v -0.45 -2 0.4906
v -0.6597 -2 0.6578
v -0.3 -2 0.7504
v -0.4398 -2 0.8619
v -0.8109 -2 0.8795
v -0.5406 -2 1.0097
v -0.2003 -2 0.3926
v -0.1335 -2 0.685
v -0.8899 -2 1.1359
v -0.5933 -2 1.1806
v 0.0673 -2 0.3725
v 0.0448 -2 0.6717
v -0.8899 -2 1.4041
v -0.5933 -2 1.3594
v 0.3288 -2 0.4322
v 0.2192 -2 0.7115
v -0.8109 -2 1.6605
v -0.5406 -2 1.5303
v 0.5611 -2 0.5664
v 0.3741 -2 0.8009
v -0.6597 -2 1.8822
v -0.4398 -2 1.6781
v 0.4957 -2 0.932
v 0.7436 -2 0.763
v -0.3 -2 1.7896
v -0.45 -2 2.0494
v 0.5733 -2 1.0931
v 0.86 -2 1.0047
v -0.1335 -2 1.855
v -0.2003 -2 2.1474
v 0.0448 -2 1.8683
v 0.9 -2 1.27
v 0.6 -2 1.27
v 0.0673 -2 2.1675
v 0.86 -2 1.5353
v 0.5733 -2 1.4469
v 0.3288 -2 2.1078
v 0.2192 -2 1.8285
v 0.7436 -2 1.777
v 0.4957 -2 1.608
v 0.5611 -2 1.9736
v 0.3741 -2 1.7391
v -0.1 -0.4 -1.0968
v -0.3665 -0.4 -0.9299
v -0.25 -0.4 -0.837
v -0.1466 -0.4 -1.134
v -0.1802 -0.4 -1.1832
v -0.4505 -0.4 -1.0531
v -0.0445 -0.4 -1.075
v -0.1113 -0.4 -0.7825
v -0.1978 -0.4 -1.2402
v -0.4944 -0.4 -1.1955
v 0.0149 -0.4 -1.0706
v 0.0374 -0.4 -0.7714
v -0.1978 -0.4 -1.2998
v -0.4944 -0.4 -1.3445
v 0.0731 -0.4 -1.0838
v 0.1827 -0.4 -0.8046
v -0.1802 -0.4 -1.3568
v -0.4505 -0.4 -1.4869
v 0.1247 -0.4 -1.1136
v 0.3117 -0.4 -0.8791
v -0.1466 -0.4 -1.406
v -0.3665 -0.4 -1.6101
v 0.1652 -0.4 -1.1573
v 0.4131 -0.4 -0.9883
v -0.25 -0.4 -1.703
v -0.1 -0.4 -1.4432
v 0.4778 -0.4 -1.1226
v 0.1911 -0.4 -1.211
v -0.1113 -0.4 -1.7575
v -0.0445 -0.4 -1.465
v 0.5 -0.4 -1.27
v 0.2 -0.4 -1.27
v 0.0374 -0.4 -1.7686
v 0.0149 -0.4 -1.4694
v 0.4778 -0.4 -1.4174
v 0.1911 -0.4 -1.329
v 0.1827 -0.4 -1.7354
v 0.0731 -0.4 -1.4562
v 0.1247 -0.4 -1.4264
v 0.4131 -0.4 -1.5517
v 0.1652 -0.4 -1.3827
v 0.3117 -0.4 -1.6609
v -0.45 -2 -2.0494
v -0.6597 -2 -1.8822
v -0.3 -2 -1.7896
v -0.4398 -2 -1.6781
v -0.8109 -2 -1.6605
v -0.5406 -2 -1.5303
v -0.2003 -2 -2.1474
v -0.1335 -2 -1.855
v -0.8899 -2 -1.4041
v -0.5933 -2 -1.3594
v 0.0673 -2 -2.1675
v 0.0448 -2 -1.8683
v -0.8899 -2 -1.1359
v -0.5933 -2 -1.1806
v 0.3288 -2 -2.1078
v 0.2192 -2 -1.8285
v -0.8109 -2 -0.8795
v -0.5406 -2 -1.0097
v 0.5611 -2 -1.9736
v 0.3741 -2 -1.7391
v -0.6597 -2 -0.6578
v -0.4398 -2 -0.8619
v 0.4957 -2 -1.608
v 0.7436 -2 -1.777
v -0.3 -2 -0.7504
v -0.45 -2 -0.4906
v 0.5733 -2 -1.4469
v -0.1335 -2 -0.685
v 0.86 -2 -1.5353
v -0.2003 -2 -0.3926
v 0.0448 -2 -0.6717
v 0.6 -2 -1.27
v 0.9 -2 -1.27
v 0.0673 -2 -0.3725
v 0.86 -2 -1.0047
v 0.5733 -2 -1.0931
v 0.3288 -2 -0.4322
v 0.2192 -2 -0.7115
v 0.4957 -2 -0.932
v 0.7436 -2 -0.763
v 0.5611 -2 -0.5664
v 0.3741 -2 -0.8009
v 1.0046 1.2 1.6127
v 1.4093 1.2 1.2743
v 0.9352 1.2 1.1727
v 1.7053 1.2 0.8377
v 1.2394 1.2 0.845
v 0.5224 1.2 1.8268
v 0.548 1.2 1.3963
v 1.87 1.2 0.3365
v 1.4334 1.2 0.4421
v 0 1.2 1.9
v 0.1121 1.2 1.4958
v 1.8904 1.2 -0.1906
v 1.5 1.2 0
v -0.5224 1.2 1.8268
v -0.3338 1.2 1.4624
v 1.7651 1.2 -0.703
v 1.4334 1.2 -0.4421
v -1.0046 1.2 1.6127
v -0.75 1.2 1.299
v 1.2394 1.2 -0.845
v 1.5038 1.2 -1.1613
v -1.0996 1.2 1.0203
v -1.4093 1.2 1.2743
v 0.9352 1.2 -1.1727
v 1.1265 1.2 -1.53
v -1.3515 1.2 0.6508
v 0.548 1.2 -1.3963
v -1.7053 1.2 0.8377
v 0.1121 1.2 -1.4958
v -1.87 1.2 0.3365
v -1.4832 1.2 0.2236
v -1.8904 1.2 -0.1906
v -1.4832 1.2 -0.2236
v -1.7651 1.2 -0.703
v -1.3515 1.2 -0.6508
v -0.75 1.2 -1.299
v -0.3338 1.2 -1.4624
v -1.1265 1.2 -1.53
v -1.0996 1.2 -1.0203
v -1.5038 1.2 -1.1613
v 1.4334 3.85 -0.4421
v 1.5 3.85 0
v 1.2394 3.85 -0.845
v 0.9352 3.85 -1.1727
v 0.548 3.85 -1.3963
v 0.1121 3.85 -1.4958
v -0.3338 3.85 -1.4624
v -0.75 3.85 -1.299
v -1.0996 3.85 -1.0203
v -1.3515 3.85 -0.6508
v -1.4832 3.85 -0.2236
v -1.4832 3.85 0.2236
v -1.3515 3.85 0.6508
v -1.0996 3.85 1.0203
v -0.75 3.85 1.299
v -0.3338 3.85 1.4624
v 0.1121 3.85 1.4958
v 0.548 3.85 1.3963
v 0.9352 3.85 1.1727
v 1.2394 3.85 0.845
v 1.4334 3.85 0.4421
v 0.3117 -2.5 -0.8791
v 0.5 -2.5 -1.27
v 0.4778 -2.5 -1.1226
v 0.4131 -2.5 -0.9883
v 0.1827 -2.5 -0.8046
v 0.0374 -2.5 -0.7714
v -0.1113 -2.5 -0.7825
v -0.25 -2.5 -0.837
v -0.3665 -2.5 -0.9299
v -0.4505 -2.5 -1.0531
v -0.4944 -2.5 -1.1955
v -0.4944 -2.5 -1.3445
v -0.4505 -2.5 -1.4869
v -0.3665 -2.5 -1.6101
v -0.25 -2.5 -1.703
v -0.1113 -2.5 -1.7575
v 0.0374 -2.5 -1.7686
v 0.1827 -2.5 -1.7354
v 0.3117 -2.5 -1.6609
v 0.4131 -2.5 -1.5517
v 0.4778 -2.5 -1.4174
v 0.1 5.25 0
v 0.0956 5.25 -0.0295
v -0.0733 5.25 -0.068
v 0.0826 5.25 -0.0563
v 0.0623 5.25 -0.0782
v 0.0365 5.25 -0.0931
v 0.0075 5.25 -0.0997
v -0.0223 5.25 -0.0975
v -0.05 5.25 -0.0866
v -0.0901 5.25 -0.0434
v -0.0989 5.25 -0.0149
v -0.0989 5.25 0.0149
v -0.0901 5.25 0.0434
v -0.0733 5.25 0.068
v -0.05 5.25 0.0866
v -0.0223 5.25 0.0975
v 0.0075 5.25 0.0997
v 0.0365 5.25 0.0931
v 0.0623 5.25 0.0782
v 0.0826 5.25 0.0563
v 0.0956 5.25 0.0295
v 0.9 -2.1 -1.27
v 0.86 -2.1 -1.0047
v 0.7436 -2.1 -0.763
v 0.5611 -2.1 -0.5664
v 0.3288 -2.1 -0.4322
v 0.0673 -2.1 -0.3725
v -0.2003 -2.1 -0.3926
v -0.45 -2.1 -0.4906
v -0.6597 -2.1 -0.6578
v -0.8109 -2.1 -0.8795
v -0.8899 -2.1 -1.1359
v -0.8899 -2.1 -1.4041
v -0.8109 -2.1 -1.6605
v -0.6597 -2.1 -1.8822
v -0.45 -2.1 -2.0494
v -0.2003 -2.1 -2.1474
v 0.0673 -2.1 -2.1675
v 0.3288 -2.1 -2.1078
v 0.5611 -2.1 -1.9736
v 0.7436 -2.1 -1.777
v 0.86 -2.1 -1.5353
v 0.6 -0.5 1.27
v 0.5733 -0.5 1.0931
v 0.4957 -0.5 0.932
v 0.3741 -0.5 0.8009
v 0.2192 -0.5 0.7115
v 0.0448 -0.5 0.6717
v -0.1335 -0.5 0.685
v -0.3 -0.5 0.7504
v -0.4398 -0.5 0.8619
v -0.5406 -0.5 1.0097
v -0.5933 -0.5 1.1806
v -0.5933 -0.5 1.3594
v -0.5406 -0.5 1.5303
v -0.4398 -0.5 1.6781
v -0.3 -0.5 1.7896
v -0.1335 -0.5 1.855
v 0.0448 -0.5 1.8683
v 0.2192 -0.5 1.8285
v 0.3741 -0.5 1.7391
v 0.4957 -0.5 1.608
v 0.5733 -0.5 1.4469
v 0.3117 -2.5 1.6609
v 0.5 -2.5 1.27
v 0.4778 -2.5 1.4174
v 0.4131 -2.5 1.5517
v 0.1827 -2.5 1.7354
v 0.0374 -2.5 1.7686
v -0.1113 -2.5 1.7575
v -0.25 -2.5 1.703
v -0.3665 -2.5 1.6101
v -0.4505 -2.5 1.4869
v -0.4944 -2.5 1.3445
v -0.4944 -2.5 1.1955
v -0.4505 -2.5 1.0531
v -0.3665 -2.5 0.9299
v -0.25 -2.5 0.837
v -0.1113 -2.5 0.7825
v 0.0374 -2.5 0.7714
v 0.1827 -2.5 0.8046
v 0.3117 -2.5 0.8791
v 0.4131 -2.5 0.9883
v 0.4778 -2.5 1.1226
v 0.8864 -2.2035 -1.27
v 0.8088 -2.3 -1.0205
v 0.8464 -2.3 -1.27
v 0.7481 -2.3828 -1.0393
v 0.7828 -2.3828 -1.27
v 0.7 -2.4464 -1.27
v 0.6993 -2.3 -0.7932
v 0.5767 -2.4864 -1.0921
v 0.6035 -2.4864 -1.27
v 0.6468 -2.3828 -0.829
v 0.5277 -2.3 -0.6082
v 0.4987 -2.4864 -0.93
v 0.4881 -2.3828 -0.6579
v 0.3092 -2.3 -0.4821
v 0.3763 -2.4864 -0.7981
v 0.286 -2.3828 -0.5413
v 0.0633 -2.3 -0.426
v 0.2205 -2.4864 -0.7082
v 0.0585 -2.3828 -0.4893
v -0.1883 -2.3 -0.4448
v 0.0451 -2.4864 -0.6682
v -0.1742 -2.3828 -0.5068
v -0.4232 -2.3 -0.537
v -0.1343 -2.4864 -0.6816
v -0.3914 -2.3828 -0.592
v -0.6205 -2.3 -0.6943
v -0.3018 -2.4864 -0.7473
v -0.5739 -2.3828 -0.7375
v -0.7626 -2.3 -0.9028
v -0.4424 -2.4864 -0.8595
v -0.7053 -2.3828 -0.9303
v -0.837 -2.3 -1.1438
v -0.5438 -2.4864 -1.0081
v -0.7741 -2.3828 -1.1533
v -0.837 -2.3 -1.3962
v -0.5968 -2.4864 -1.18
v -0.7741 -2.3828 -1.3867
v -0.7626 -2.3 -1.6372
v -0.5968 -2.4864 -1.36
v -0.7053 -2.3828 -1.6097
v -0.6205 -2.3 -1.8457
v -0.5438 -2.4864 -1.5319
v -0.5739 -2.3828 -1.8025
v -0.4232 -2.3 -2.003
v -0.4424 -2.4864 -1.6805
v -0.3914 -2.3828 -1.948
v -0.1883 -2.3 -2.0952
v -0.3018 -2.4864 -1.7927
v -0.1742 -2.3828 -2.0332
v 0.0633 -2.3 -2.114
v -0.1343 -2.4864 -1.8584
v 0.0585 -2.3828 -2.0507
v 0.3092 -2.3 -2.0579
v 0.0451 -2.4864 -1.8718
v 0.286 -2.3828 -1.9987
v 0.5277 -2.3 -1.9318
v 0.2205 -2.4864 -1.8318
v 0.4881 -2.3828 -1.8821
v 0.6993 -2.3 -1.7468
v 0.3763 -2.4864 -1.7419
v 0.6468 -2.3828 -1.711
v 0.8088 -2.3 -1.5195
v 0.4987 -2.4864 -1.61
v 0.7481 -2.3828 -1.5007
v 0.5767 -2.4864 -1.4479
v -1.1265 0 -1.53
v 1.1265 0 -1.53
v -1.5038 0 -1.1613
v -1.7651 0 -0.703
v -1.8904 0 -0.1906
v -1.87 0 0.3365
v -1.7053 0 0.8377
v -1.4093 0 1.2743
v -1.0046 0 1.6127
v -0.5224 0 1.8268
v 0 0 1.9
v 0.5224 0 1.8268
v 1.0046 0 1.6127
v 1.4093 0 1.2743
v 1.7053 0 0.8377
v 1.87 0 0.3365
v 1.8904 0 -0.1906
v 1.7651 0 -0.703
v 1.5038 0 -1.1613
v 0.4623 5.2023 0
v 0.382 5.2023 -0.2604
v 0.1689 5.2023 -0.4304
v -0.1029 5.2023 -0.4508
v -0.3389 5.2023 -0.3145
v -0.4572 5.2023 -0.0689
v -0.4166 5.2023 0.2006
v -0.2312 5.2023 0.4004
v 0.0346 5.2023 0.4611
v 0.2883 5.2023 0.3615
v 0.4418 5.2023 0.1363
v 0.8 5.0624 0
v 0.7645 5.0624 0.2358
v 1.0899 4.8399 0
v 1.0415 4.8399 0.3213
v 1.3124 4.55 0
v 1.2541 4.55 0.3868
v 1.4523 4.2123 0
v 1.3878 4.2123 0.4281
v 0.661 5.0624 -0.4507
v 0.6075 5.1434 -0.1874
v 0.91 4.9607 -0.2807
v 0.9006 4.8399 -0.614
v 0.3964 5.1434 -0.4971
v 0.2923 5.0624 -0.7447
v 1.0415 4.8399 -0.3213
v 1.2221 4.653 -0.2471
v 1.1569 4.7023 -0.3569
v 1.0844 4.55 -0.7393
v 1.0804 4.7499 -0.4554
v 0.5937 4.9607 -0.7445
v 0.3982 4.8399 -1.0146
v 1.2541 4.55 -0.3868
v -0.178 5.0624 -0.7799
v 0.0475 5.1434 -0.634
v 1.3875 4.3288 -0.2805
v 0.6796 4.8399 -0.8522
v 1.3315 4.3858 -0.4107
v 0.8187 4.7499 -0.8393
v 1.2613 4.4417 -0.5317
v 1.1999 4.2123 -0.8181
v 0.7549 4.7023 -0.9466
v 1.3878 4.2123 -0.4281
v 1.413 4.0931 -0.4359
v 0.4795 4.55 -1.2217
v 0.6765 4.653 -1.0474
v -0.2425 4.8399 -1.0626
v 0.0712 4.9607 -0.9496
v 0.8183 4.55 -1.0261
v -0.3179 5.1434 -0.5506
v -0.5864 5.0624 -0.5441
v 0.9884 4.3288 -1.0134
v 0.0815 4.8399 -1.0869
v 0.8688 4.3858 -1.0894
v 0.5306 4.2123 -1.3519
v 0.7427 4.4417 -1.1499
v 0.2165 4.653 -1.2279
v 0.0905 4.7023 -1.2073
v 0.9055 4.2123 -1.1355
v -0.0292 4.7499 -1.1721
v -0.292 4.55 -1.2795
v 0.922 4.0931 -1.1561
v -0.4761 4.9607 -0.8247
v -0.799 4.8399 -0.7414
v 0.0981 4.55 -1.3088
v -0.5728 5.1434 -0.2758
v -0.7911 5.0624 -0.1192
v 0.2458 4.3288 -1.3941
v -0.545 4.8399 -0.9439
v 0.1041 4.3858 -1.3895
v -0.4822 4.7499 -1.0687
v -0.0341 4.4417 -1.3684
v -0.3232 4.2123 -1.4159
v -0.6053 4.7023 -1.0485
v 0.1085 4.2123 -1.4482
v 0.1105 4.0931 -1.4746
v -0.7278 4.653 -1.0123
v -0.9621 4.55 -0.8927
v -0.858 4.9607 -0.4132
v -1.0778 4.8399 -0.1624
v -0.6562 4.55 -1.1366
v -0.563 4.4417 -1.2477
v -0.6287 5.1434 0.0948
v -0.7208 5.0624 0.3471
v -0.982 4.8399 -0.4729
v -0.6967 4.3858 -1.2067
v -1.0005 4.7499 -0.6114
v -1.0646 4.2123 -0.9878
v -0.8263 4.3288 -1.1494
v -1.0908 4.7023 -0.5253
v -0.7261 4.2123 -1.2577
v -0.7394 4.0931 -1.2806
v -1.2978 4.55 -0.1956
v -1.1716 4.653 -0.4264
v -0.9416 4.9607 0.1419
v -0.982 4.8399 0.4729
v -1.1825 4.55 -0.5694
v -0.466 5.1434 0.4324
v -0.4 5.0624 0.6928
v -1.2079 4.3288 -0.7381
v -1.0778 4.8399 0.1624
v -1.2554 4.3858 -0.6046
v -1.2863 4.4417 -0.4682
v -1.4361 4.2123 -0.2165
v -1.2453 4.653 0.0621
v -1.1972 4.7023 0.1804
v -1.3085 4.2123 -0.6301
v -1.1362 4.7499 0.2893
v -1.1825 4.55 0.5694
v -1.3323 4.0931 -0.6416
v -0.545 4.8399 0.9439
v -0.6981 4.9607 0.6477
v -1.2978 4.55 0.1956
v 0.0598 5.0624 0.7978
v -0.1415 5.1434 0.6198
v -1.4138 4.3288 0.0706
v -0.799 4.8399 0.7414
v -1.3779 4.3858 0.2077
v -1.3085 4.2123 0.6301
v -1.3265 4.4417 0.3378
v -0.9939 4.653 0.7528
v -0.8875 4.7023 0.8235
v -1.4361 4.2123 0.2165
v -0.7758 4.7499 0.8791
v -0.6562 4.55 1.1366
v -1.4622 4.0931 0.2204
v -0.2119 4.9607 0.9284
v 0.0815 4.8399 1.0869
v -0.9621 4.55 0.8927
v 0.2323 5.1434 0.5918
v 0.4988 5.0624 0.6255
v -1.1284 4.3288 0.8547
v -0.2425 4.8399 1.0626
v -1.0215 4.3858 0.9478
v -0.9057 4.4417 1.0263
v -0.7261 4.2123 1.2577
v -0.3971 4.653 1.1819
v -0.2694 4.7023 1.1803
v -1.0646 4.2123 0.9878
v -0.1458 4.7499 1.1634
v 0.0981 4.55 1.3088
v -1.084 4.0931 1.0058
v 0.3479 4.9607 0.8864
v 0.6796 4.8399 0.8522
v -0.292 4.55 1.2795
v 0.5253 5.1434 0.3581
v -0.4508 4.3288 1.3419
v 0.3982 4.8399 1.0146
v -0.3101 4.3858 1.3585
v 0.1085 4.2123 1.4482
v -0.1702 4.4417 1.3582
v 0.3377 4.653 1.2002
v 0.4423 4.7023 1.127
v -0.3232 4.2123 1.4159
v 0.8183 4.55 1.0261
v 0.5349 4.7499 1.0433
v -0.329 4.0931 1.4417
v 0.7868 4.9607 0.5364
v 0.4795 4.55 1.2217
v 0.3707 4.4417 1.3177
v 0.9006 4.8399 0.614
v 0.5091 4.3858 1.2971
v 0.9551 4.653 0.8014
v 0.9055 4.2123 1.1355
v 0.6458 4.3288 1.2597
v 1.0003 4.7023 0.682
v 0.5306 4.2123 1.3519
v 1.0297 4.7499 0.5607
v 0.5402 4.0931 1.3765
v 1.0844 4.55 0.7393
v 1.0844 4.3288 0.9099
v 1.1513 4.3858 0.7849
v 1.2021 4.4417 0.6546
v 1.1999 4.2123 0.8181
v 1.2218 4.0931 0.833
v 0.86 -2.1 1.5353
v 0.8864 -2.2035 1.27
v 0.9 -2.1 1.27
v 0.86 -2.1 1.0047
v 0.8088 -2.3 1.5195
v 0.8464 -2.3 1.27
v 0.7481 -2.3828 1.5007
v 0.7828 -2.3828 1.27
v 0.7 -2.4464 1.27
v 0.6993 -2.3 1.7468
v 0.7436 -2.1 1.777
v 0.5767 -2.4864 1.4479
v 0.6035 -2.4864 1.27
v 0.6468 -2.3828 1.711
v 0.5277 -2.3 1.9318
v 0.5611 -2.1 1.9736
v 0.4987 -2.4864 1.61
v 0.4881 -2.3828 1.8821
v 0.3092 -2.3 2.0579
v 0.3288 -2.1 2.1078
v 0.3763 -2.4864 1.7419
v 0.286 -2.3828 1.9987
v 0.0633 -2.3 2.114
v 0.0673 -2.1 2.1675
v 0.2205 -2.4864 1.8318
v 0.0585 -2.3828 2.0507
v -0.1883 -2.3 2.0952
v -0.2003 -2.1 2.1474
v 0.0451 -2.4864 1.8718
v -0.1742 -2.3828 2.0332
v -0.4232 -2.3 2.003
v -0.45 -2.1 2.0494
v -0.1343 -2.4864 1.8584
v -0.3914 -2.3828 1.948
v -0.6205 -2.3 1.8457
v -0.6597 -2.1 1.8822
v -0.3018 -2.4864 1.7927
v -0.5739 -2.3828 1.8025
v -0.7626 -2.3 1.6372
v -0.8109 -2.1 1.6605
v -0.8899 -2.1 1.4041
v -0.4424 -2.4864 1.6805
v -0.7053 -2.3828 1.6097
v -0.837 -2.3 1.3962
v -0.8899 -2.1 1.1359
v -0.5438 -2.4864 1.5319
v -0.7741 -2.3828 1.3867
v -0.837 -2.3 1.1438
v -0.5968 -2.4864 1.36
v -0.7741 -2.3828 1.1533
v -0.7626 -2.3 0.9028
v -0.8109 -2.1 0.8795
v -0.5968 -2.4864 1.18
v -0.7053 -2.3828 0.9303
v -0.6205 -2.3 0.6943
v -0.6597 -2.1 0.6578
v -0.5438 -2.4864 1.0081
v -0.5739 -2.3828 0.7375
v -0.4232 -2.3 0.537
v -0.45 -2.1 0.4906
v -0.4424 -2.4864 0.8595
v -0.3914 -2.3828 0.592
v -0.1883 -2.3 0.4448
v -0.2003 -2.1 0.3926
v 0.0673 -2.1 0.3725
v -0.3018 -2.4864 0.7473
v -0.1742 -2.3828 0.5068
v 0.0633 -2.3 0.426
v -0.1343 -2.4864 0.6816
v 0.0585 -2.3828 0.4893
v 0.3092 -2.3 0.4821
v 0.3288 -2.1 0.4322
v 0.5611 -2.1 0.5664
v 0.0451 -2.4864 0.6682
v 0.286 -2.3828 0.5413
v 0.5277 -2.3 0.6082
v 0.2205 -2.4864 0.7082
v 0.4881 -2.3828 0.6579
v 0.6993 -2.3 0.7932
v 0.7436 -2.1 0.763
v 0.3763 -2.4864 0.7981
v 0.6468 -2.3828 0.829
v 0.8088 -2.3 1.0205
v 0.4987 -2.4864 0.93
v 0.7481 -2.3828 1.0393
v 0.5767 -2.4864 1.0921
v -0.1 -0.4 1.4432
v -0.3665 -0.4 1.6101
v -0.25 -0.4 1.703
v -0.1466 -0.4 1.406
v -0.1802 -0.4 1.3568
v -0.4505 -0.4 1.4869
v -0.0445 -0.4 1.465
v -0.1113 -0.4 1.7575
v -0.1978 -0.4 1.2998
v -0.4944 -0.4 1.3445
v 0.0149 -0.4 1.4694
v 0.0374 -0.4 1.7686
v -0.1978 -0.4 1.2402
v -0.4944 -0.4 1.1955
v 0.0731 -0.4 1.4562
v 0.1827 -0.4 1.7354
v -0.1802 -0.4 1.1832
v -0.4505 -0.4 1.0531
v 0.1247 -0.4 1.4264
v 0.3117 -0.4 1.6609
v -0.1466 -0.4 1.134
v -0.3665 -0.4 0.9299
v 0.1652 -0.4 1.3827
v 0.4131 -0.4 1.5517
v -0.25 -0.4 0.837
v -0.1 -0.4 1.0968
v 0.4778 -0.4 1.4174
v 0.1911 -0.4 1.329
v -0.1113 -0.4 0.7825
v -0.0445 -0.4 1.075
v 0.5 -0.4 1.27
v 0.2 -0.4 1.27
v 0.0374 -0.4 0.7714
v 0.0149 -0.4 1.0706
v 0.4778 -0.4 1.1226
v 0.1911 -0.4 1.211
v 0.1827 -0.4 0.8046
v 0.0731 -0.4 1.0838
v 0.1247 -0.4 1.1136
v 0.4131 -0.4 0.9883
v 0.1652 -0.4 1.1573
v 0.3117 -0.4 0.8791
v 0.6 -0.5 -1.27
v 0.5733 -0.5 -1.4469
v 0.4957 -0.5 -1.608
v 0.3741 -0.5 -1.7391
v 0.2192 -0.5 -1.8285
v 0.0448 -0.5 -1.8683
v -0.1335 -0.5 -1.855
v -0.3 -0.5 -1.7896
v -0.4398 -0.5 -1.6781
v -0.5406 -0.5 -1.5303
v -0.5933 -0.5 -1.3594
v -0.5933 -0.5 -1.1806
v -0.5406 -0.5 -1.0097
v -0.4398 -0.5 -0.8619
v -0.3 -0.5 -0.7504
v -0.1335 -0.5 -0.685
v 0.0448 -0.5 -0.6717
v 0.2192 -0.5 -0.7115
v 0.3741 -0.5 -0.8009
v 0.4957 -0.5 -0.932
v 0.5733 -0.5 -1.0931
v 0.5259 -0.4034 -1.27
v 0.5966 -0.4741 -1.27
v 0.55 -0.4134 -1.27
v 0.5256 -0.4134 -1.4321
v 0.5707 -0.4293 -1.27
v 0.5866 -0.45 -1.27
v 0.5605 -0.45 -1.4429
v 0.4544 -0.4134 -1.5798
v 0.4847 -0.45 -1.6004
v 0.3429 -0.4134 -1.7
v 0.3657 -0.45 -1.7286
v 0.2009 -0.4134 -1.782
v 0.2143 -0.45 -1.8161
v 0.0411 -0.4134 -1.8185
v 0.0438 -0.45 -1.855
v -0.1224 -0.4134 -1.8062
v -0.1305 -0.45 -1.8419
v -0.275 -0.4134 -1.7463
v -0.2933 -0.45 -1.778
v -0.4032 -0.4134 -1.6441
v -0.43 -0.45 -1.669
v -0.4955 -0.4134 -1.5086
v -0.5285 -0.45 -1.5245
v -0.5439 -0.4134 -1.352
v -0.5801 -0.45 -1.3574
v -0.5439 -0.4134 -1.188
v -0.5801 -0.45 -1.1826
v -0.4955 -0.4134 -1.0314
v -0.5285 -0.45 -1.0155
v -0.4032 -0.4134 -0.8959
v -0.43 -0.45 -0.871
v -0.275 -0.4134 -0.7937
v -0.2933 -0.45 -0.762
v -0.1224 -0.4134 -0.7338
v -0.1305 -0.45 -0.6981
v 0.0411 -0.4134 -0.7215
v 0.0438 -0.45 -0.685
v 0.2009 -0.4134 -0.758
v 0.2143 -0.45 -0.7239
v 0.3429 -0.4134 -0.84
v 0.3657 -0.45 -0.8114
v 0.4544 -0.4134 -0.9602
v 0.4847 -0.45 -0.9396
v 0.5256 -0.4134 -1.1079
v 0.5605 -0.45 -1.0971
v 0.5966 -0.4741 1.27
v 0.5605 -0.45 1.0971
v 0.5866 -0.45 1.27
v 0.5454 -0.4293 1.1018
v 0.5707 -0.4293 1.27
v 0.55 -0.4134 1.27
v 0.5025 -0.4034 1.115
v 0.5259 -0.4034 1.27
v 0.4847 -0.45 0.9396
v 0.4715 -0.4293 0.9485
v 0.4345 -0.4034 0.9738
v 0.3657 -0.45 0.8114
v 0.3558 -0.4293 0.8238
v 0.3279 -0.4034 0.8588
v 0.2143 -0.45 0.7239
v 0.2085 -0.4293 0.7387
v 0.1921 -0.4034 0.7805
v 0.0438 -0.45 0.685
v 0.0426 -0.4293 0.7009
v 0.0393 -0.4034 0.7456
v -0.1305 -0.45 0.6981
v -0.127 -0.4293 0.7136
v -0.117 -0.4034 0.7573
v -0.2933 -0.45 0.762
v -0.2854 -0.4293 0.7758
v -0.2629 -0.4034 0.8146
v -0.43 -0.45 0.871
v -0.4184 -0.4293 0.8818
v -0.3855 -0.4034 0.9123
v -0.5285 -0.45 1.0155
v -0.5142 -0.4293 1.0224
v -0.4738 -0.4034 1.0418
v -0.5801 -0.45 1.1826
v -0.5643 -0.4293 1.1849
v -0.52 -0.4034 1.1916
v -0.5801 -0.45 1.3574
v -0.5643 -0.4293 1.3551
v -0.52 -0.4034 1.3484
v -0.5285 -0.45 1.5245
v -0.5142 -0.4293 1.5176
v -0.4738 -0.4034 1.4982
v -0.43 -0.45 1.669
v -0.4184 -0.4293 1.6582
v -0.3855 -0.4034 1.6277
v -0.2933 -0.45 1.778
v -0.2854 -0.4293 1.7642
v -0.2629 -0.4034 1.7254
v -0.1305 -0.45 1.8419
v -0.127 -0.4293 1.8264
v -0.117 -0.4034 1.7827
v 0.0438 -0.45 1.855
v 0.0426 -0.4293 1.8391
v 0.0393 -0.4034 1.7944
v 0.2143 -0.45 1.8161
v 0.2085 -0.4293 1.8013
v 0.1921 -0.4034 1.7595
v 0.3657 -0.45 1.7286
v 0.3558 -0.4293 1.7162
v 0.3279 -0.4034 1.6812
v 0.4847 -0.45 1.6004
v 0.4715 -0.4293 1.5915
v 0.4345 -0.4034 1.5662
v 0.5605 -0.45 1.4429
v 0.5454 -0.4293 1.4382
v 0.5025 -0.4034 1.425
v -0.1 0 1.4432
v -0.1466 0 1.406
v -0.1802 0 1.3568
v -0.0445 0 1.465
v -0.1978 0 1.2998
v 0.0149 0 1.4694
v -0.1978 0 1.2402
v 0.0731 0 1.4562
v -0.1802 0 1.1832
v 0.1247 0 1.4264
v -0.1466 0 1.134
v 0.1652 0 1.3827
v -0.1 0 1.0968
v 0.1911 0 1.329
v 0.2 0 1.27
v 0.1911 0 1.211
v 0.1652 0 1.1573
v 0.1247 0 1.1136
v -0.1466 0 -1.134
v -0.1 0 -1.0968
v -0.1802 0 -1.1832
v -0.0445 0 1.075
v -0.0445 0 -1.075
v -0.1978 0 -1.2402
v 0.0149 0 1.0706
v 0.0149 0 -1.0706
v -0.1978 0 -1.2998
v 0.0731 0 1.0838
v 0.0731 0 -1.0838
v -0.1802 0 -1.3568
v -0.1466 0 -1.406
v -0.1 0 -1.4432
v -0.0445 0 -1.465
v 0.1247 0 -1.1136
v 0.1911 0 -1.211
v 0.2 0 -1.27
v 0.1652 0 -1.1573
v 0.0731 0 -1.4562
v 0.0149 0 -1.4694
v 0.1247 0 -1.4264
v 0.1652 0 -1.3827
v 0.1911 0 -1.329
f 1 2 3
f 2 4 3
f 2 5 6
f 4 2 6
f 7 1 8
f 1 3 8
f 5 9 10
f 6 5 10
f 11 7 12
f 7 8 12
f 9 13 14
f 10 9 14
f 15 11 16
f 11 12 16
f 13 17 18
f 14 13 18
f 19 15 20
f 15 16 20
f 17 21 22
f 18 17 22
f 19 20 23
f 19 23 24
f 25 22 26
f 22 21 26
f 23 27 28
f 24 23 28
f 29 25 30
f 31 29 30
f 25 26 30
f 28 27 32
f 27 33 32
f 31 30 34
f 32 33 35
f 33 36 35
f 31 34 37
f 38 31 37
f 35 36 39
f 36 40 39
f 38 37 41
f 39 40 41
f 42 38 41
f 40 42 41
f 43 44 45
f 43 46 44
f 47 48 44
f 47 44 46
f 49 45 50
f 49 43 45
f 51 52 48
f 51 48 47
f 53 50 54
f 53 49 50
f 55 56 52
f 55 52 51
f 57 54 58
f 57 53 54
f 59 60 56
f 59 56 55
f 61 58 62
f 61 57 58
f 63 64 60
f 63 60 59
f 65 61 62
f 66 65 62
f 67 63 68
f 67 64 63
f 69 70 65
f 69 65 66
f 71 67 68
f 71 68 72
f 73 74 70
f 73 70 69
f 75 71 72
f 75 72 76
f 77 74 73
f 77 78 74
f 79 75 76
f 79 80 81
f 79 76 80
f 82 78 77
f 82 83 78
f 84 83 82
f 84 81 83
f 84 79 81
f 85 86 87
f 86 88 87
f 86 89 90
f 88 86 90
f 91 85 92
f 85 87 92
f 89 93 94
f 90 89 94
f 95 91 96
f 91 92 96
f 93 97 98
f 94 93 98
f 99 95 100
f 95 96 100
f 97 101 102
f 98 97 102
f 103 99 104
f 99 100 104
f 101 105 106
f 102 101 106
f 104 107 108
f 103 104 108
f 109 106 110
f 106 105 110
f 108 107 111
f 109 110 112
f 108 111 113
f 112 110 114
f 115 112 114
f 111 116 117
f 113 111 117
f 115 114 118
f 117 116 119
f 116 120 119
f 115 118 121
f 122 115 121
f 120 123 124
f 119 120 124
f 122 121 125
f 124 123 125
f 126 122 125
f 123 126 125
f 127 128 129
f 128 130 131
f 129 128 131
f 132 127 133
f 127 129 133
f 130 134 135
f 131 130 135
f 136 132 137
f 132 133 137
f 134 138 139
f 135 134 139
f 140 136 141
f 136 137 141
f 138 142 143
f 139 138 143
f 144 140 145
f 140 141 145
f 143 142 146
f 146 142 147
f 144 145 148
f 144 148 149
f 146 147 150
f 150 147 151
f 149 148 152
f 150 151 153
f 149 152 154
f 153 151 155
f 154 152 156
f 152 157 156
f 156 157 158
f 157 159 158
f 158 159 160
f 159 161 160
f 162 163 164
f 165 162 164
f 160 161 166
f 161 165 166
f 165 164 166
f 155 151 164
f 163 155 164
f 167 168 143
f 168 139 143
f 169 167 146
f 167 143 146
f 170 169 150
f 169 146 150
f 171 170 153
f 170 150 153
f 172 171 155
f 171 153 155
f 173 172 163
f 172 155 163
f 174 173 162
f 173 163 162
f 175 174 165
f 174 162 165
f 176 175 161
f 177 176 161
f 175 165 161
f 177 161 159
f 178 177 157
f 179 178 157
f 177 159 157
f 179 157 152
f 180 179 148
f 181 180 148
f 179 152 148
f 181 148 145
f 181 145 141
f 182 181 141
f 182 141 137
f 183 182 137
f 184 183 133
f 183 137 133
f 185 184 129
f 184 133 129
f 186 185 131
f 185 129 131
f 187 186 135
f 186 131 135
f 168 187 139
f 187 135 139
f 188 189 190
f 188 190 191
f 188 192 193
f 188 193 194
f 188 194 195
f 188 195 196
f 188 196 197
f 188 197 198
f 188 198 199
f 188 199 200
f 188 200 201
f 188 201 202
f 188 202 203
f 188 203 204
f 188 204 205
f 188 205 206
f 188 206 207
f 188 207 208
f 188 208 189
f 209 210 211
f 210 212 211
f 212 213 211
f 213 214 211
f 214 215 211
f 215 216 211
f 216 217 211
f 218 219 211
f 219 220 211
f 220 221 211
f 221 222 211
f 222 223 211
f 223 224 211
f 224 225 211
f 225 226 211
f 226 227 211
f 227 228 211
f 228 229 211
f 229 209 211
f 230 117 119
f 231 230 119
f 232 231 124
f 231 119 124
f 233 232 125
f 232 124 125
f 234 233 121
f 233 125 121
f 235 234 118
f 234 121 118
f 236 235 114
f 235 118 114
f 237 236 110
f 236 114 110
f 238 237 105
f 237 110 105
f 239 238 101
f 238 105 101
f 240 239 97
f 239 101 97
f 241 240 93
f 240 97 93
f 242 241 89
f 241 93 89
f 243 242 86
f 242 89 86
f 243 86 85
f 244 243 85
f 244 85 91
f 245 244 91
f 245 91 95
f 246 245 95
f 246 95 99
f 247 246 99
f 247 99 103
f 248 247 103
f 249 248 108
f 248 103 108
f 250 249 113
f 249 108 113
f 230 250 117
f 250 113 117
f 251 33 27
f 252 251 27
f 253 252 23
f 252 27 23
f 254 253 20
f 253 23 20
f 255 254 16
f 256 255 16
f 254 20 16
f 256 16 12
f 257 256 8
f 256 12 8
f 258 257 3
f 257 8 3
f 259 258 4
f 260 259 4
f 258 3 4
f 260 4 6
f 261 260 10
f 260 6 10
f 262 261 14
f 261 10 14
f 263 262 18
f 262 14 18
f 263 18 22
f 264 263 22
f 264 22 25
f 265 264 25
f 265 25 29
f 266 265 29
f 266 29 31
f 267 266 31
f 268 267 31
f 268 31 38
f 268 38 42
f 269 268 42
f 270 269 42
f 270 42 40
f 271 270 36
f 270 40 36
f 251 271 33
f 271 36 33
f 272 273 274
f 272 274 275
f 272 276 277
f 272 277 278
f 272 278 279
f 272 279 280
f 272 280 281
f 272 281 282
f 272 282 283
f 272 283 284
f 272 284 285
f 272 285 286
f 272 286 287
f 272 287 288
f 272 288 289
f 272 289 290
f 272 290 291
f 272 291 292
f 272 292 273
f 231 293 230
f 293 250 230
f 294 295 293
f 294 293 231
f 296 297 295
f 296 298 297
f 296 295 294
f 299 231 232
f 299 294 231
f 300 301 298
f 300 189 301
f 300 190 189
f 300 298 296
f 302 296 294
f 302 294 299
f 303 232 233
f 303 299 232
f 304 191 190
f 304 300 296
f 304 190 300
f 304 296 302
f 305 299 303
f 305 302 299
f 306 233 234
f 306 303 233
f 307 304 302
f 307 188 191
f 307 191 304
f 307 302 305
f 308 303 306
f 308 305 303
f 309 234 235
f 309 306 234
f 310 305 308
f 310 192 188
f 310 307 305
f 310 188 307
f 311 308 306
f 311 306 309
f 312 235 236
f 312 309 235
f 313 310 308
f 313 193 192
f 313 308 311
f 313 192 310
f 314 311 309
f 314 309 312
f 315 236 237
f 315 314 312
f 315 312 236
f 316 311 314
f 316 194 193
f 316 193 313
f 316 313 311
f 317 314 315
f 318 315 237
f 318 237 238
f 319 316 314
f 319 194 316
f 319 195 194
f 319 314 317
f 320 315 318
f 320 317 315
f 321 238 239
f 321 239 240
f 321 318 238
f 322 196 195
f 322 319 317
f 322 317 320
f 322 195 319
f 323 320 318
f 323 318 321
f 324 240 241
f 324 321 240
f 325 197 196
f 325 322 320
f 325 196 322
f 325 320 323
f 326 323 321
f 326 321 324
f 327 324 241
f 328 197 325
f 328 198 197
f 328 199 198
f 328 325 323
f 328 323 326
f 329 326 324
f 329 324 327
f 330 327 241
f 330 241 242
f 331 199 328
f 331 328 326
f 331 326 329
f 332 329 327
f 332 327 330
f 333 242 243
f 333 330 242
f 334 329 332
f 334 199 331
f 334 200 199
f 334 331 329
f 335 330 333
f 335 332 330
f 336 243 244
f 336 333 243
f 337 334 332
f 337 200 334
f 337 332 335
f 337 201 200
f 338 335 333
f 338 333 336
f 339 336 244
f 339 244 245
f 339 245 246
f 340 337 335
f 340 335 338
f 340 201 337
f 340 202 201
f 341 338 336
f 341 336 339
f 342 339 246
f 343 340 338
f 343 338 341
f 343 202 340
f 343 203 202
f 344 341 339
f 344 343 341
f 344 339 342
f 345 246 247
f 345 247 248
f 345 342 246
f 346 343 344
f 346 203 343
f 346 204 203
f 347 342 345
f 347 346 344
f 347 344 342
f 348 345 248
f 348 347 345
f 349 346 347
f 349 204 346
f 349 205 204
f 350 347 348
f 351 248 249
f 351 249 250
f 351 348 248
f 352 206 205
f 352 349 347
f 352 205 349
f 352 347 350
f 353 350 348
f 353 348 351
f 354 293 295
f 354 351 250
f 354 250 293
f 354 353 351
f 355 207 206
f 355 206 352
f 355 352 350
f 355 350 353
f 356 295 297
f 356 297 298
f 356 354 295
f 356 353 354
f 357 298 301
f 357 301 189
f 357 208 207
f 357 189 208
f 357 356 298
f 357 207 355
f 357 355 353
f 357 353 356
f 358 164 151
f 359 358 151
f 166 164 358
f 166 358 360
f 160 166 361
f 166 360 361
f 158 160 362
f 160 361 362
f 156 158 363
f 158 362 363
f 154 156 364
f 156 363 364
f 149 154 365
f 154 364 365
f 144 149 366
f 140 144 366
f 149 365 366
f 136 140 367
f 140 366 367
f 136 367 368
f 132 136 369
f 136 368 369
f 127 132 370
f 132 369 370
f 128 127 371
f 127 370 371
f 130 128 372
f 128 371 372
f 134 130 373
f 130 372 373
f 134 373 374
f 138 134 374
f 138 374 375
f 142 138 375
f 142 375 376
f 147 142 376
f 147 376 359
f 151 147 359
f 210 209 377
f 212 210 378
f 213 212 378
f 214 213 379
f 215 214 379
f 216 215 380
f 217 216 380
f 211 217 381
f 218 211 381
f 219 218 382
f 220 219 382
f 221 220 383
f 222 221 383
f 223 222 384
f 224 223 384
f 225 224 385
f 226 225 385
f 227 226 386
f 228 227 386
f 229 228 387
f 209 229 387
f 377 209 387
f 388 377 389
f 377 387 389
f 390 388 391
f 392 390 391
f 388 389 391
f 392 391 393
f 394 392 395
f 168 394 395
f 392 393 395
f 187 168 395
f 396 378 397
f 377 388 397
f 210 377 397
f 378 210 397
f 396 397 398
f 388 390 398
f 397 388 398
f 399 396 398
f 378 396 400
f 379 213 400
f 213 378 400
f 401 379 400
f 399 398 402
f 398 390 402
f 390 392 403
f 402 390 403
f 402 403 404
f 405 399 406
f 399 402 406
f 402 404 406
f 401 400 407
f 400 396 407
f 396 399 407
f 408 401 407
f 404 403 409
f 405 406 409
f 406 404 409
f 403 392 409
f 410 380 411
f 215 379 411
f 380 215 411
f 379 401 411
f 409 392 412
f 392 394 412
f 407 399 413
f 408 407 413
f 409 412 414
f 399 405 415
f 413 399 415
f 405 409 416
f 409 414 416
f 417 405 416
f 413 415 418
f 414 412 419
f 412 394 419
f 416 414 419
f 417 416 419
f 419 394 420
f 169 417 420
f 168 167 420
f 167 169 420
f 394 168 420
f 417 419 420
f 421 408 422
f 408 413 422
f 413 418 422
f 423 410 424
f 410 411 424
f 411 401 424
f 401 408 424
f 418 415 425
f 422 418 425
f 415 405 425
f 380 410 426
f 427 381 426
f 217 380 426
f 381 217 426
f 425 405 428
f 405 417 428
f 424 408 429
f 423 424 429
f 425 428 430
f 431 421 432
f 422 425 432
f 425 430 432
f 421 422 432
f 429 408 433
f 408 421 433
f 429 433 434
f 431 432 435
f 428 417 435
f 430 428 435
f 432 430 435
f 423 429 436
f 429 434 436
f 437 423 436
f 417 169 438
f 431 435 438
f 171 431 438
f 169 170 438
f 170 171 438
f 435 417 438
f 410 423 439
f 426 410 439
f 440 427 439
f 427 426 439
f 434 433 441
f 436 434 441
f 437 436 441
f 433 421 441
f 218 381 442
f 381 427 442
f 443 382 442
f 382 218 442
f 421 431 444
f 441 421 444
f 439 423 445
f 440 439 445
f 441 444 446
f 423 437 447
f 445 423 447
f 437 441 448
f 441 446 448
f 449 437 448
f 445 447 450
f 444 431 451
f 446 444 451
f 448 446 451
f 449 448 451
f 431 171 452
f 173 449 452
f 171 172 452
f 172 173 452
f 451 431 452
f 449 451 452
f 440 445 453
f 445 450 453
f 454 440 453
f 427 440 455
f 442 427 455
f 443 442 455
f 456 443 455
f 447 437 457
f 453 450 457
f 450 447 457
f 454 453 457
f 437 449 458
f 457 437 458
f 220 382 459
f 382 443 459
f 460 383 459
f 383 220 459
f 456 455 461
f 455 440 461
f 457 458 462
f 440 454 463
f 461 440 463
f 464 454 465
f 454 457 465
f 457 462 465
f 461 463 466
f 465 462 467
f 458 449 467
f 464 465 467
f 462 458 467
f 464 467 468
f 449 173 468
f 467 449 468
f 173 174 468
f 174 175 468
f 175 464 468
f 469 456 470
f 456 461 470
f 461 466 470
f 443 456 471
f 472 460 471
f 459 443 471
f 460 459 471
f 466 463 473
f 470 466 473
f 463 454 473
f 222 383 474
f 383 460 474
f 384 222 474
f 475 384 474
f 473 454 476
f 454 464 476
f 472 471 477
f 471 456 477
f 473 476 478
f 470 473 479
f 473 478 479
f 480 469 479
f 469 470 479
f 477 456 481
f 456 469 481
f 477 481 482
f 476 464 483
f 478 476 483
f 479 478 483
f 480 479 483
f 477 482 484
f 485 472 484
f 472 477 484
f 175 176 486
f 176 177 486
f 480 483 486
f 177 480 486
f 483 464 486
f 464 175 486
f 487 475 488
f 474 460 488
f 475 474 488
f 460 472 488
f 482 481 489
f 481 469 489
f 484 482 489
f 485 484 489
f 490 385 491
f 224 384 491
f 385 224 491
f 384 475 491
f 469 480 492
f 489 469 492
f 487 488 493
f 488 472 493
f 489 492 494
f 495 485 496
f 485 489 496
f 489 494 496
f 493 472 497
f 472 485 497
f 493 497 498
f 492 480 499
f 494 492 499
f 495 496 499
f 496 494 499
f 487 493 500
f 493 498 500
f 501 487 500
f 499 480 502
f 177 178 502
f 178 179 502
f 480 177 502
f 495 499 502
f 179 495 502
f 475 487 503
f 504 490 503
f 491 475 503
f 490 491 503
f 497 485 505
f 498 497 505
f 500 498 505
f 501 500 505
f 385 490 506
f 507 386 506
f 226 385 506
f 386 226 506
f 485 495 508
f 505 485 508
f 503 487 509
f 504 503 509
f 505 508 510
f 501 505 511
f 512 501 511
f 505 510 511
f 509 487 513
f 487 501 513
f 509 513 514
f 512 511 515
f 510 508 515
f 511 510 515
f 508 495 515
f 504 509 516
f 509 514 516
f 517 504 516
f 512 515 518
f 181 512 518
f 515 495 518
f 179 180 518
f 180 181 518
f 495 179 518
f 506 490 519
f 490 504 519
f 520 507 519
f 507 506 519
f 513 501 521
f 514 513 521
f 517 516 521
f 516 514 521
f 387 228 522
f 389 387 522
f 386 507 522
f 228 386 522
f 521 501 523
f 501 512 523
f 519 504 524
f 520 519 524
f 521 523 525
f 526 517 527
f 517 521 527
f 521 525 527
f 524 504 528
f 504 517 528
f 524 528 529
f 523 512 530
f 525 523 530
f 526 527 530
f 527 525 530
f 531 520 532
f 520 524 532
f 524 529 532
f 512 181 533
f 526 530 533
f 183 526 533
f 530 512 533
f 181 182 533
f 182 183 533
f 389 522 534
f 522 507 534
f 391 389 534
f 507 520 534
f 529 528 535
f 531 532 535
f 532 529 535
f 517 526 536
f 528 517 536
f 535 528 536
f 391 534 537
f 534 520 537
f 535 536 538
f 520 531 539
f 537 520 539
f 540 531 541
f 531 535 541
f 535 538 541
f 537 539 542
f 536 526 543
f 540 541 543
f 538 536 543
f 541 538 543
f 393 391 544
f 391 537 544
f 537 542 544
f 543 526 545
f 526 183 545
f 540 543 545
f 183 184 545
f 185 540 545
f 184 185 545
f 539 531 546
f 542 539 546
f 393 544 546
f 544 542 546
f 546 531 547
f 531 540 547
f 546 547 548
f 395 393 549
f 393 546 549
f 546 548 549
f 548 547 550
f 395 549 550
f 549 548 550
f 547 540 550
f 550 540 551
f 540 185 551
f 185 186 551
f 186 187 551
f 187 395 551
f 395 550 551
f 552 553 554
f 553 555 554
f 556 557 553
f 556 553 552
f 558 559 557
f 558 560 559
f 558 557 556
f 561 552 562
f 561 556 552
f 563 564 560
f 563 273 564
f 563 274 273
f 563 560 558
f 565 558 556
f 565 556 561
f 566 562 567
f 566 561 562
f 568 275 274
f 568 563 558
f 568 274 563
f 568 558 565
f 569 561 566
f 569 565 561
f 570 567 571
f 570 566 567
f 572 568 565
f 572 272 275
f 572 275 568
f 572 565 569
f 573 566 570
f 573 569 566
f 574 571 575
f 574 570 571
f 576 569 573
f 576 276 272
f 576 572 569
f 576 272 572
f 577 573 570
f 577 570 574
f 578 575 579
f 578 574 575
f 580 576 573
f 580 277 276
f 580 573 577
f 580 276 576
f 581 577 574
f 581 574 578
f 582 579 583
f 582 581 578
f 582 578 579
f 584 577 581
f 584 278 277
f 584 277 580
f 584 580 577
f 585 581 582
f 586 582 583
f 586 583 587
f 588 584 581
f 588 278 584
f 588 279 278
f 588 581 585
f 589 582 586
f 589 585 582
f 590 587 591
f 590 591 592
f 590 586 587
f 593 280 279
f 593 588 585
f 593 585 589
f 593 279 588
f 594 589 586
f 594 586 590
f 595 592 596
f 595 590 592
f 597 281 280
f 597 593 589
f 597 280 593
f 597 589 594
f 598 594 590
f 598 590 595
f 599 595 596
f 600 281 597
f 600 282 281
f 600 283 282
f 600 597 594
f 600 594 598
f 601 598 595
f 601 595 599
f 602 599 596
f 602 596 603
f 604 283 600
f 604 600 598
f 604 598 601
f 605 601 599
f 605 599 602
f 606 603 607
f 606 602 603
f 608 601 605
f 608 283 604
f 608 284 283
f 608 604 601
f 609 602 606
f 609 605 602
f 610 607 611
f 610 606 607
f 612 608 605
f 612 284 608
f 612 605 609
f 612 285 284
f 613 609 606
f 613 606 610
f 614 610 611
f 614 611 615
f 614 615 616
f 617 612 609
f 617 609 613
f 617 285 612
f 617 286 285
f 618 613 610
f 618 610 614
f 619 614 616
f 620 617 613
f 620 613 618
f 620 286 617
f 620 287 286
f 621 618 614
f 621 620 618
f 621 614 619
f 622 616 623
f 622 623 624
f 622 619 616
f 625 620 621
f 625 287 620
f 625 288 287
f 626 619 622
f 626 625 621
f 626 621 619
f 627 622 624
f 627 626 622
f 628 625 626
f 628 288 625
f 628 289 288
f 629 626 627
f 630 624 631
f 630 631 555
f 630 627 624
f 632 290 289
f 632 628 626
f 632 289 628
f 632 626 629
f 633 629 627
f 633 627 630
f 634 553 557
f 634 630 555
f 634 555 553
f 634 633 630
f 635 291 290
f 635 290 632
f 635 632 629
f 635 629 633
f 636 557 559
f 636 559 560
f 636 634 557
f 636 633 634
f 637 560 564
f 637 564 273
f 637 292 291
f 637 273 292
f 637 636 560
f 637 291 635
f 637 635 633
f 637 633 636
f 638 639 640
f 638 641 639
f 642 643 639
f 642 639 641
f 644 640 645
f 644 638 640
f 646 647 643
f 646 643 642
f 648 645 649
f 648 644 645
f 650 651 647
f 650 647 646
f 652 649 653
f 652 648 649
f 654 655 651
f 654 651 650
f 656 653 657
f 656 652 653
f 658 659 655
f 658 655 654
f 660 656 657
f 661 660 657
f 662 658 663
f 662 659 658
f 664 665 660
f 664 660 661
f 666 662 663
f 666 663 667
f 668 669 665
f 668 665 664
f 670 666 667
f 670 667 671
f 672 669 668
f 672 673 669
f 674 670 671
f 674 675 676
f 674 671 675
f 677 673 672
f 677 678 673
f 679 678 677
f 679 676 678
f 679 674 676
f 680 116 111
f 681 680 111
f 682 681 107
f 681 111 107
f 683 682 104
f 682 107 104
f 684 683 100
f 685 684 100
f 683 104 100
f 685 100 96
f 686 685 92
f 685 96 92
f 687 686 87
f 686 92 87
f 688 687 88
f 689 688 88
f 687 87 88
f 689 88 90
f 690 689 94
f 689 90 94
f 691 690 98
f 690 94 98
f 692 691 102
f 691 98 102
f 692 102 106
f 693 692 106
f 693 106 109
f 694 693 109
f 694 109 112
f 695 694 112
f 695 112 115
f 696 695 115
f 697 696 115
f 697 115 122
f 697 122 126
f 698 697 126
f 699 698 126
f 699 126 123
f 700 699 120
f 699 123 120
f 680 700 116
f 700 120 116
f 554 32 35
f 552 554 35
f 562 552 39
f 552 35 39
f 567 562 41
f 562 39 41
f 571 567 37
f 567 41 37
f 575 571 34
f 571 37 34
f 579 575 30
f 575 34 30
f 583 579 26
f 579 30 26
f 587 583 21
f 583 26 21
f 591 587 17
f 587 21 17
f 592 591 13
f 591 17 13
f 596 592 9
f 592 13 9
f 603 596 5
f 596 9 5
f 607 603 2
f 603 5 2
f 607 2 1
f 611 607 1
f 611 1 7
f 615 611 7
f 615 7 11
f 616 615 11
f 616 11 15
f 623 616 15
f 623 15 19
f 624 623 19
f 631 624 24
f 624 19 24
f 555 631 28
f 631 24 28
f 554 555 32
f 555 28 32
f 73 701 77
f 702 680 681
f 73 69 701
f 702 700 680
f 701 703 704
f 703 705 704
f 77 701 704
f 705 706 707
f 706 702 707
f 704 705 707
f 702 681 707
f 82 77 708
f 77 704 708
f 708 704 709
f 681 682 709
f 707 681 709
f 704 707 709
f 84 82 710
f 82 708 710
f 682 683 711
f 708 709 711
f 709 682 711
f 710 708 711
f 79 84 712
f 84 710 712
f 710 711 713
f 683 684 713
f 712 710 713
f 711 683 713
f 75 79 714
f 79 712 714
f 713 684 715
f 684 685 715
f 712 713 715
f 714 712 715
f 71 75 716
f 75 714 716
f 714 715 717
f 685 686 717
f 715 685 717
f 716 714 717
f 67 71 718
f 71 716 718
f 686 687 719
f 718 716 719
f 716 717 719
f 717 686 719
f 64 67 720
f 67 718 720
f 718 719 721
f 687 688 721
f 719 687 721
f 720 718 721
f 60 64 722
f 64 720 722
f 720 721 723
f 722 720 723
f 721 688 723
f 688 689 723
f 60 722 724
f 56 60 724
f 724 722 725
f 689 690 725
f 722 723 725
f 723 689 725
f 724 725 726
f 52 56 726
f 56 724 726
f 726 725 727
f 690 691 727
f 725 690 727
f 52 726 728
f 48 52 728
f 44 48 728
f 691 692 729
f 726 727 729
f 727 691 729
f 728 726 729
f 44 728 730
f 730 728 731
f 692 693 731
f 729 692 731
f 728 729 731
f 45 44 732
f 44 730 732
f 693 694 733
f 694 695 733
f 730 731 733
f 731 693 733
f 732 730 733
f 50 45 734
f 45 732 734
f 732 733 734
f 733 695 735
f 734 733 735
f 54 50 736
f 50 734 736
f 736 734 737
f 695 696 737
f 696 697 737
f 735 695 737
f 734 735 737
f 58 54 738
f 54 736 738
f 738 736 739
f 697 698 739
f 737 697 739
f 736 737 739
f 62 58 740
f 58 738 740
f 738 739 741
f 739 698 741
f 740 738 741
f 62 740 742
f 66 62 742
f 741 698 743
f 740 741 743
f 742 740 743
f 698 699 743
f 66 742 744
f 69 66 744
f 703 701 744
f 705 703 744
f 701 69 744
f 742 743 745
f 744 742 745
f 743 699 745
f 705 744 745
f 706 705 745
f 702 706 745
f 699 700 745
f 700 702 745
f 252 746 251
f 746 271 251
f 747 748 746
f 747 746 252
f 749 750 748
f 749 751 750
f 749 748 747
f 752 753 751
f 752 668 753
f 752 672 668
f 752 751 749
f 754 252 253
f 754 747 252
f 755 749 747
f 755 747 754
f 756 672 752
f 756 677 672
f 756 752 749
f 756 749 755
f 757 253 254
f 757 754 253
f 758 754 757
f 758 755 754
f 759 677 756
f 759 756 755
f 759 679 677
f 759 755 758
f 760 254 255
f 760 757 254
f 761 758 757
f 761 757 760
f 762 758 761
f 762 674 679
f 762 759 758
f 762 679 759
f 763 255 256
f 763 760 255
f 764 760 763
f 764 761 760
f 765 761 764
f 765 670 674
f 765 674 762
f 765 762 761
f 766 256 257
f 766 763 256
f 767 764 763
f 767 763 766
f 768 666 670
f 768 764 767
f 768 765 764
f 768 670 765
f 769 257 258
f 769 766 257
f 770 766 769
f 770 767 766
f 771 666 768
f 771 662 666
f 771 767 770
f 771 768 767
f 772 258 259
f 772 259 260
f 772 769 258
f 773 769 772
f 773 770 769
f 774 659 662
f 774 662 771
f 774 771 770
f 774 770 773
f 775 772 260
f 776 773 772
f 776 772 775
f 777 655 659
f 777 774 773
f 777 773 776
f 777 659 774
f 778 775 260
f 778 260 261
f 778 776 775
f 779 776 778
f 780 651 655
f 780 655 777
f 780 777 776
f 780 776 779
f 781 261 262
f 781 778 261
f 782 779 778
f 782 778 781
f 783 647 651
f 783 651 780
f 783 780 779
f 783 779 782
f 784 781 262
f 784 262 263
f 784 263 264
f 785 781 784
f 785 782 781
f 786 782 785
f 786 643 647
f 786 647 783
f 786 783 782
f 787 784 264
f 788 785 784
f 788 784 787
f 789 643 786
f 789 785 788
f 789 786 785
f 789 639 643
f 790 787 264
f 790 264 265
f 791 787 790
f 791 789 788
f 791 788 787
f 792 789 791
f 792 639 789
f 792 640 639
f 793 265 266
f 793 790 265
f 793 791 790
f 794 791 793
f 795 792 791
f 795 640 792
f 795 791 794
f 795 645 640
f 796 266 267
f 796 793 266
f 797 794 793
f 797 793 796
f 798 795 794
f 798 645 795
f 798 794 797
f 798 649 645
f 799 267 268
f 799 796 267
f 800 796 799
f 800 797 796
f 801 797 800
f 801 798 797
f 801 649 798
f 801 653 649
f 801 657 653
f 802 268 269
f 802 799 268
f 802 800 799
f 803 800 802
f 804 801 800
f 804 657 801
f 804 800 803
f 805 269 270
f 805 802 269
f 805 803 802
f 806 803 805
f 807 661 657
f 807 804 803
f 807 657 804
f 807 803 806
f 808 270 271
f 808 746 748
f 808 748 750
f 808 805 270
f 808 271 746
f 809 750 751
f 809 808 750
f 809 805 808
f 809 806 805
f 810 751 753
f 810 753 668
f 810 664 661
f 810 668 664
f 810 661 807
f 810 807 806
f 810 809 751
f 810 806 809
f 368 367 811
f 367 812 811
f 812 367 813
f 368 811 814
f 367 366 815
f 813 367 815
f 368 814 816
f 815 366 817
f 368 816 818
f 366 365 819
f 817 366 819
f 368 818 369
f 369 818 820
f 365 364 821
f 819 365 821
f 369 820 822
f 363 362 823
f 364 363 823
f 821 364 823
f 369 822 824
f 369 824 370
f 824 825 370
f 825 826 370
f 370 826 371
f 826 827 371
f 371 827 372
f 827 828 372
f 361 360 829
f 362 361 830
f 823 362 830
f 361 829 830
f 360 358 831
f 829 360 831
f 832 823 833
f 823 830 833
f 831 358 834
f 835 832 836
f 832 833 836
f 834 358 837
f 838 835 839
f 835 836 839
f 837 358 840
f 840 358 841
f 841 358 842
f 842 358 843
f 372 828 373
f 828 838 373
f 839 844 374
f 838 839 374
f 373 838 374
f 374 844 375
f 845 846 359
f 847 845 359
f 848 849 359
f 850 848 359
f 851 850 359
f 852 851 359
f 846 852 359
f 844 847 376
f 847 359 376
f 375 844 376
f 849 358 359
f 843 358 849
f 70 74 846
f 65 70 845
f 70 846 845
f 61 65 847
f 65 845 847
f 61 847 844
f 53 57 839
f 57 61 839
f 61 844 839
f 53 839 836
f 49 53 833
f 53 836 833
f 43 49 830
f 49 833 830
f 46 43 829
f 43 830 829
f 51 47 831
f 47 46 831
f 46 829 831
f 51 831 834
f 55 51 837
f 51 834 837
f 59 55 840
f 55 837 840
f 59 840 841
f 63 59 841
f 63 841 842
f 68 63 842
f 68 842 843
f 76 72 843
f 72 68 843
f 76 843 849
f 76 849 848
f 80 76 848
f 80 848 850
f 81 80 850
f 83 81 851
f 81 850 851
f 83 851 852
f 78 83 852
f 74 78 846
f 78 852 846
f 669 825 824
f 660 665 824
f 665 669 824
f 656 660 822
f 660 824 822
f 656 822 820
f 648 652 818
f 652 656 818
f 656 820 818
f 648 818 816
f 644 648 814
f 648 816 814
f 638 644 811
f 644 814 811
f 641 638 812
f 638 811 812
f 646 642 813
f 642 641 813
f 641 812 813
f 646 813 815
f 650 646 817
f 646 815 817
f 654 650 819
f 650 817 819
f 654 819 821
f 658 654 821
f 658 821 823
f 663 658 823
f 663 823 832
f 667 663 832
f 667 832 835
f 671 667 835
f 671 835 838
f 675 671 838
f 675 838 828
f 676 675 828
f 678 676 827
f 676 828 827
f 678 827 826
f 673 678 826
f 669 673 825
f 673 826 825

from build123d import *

# Parameters (mm, degrees)
SKETCH2_W               = 3
SKETCH2_H               = 0.5
CUT_EXTRUDE1_DEPTH      = 1.2
SKETCH3_R               = 0.2
BOSS_EXTRUDE1_DEPTH     = 17.5
SKETCH4_R               = 0.2
BOSS_EXTRUDE2_DEPTH     = 1.5
SKETCH5_W               = 5
SKETCH5_H               = 17
CUT_EXTRUDE2_DEPTH      = 2.9
CUT_EXTRUDE2_DEPTH_BACK = 2.9
SKETCH6_R               = 0.9
BOSS_EXTRUDE3_DEPTH     = 0.5
FILLET2_R               = 0.4
SKETCH7_R               = 0.6
BOSS_EXTRUDE4_DEPTH     = 1.6
FILLET3_R               = 0.1


with BuildPart() as part:
    # Sketch1 → Revolve1 (revolve)
    with BuildSketch(Plane.XY):
        with BuildLine():
            Line((0, 0), (0, 5.25))
            Line((0, 5.25), (0.1, 5.25))
            ThreePointArc((0.1, 5.25), (1.089949494, 4.839949494), (1.5, 3.85))
            Line((1.5, 3.85), (1.5, 1.2))
            Line((1.5, 1.2), (1.9, 1.2))
            Line((1.9, 1.2), (1.9, 0))
            Line((1.9, 0), (0, 0))
        make_face()
    revolve(axis=Axis((0, 0, 0), (0, 1, 0)))

    # Sketch2 → Cut-Extrude1 (cut)
    with BuildSketch(Plane(origin=(0, 1.2, 0), x_dir=(1, 0, 0), z_dir=(0, 1, 0))):
        with Locations((0, 1.78)):
            Rectangle(SKETCH2_W, SKETCH2_H)
    extrude(amount=-CUT_EXTRUDE1_DEPTH, mode=Mode.SUBTRACT)

    # Sketch3 → Boss-Extrude1 (add)
    with BuildSketch(Plane.XZ):
        with Locations((0, 1.27)):
            Circle(SKETCH3_R)
        with Locations((0, -1.27)):
            Circle(SKETCH3_R)
    extrude(amount=BOSS_EXTRUDE1_DEPTH)

    # Sketch4 → Boss-Extrude2 (add)
    with BuildSketch(Plane.XZ.offset(17.5)):
        with Locations((0, 1.27)):
            Circle(SKETCH4_R)
    extrude(amount=BOSS_EXTRUDE2_DEPTH)

    # Sketch5 → Cut-Extrude2 (cut, two sides)
    with BuildSketch(Plane(origin=(0, 0, 0), x_dir=(0, 0, -1), z_dir=(1, 0, 0))) as cut_extrude2_sk:
        with Locations((0, -10.5)):
            Rectangle(SKETCH5_W, SKETCH5_H)
    extrude(amount=CUT_EXTRUDE2_DEPTH, mode=Mode.SUBTRACT)
    extrude(cut_extrude2_sk.sketch, amount=-CUT_EXTRUDE2_DEPTH_BACK, mode=Mode.SUBTRACT)

    # Sketch6 → Boss-Extrude3 (add)
    with BuildSketch(Plane.XZ.offset(2)):
        with Locations((0, 1.27)):
            Circle(SKETCH6_R)
        with Locations((0, -1.27)):
            Circle(SKETCH6_R)
    extrude(amount=BOSS_EXTRUDE3_DEPTH)

    # Fillet2
    fillet2_edges = [part.edges().sort_by_distance(p)[0] for p in [
        (-0.9, -2.5, 1.27),
        (-0.9, -2.5, -1.27),
    ]]
    fillet(fillet2_edges, radius=FILLET2_R)

    # Sketch7 → Boss-Extrude4 (add)
    with BuildSketch(Plane(origin=(0, -2, 0), x_dir=(1, 0, 0), z_dir=(0, 1, 0))):
        with Locations((0, -1.27)):
            Circle(SKETCH7_R)
        with Locations((0, 1.27)):
            Circle(SKETCH7_R)
    extrude(amount=BOSS_EXTRUDE4_DEPTH)

    # Fillet3
    fillet3_edges = [part.edges().sort_by_distance(p)[0] for p in [
        (-0.6, -0.4, 1.27),
        (-0.6, -0.4, -1.27),
    ]]
    fillet(fillet3_edges, radius=FILLET3_R)


solid = part.part
